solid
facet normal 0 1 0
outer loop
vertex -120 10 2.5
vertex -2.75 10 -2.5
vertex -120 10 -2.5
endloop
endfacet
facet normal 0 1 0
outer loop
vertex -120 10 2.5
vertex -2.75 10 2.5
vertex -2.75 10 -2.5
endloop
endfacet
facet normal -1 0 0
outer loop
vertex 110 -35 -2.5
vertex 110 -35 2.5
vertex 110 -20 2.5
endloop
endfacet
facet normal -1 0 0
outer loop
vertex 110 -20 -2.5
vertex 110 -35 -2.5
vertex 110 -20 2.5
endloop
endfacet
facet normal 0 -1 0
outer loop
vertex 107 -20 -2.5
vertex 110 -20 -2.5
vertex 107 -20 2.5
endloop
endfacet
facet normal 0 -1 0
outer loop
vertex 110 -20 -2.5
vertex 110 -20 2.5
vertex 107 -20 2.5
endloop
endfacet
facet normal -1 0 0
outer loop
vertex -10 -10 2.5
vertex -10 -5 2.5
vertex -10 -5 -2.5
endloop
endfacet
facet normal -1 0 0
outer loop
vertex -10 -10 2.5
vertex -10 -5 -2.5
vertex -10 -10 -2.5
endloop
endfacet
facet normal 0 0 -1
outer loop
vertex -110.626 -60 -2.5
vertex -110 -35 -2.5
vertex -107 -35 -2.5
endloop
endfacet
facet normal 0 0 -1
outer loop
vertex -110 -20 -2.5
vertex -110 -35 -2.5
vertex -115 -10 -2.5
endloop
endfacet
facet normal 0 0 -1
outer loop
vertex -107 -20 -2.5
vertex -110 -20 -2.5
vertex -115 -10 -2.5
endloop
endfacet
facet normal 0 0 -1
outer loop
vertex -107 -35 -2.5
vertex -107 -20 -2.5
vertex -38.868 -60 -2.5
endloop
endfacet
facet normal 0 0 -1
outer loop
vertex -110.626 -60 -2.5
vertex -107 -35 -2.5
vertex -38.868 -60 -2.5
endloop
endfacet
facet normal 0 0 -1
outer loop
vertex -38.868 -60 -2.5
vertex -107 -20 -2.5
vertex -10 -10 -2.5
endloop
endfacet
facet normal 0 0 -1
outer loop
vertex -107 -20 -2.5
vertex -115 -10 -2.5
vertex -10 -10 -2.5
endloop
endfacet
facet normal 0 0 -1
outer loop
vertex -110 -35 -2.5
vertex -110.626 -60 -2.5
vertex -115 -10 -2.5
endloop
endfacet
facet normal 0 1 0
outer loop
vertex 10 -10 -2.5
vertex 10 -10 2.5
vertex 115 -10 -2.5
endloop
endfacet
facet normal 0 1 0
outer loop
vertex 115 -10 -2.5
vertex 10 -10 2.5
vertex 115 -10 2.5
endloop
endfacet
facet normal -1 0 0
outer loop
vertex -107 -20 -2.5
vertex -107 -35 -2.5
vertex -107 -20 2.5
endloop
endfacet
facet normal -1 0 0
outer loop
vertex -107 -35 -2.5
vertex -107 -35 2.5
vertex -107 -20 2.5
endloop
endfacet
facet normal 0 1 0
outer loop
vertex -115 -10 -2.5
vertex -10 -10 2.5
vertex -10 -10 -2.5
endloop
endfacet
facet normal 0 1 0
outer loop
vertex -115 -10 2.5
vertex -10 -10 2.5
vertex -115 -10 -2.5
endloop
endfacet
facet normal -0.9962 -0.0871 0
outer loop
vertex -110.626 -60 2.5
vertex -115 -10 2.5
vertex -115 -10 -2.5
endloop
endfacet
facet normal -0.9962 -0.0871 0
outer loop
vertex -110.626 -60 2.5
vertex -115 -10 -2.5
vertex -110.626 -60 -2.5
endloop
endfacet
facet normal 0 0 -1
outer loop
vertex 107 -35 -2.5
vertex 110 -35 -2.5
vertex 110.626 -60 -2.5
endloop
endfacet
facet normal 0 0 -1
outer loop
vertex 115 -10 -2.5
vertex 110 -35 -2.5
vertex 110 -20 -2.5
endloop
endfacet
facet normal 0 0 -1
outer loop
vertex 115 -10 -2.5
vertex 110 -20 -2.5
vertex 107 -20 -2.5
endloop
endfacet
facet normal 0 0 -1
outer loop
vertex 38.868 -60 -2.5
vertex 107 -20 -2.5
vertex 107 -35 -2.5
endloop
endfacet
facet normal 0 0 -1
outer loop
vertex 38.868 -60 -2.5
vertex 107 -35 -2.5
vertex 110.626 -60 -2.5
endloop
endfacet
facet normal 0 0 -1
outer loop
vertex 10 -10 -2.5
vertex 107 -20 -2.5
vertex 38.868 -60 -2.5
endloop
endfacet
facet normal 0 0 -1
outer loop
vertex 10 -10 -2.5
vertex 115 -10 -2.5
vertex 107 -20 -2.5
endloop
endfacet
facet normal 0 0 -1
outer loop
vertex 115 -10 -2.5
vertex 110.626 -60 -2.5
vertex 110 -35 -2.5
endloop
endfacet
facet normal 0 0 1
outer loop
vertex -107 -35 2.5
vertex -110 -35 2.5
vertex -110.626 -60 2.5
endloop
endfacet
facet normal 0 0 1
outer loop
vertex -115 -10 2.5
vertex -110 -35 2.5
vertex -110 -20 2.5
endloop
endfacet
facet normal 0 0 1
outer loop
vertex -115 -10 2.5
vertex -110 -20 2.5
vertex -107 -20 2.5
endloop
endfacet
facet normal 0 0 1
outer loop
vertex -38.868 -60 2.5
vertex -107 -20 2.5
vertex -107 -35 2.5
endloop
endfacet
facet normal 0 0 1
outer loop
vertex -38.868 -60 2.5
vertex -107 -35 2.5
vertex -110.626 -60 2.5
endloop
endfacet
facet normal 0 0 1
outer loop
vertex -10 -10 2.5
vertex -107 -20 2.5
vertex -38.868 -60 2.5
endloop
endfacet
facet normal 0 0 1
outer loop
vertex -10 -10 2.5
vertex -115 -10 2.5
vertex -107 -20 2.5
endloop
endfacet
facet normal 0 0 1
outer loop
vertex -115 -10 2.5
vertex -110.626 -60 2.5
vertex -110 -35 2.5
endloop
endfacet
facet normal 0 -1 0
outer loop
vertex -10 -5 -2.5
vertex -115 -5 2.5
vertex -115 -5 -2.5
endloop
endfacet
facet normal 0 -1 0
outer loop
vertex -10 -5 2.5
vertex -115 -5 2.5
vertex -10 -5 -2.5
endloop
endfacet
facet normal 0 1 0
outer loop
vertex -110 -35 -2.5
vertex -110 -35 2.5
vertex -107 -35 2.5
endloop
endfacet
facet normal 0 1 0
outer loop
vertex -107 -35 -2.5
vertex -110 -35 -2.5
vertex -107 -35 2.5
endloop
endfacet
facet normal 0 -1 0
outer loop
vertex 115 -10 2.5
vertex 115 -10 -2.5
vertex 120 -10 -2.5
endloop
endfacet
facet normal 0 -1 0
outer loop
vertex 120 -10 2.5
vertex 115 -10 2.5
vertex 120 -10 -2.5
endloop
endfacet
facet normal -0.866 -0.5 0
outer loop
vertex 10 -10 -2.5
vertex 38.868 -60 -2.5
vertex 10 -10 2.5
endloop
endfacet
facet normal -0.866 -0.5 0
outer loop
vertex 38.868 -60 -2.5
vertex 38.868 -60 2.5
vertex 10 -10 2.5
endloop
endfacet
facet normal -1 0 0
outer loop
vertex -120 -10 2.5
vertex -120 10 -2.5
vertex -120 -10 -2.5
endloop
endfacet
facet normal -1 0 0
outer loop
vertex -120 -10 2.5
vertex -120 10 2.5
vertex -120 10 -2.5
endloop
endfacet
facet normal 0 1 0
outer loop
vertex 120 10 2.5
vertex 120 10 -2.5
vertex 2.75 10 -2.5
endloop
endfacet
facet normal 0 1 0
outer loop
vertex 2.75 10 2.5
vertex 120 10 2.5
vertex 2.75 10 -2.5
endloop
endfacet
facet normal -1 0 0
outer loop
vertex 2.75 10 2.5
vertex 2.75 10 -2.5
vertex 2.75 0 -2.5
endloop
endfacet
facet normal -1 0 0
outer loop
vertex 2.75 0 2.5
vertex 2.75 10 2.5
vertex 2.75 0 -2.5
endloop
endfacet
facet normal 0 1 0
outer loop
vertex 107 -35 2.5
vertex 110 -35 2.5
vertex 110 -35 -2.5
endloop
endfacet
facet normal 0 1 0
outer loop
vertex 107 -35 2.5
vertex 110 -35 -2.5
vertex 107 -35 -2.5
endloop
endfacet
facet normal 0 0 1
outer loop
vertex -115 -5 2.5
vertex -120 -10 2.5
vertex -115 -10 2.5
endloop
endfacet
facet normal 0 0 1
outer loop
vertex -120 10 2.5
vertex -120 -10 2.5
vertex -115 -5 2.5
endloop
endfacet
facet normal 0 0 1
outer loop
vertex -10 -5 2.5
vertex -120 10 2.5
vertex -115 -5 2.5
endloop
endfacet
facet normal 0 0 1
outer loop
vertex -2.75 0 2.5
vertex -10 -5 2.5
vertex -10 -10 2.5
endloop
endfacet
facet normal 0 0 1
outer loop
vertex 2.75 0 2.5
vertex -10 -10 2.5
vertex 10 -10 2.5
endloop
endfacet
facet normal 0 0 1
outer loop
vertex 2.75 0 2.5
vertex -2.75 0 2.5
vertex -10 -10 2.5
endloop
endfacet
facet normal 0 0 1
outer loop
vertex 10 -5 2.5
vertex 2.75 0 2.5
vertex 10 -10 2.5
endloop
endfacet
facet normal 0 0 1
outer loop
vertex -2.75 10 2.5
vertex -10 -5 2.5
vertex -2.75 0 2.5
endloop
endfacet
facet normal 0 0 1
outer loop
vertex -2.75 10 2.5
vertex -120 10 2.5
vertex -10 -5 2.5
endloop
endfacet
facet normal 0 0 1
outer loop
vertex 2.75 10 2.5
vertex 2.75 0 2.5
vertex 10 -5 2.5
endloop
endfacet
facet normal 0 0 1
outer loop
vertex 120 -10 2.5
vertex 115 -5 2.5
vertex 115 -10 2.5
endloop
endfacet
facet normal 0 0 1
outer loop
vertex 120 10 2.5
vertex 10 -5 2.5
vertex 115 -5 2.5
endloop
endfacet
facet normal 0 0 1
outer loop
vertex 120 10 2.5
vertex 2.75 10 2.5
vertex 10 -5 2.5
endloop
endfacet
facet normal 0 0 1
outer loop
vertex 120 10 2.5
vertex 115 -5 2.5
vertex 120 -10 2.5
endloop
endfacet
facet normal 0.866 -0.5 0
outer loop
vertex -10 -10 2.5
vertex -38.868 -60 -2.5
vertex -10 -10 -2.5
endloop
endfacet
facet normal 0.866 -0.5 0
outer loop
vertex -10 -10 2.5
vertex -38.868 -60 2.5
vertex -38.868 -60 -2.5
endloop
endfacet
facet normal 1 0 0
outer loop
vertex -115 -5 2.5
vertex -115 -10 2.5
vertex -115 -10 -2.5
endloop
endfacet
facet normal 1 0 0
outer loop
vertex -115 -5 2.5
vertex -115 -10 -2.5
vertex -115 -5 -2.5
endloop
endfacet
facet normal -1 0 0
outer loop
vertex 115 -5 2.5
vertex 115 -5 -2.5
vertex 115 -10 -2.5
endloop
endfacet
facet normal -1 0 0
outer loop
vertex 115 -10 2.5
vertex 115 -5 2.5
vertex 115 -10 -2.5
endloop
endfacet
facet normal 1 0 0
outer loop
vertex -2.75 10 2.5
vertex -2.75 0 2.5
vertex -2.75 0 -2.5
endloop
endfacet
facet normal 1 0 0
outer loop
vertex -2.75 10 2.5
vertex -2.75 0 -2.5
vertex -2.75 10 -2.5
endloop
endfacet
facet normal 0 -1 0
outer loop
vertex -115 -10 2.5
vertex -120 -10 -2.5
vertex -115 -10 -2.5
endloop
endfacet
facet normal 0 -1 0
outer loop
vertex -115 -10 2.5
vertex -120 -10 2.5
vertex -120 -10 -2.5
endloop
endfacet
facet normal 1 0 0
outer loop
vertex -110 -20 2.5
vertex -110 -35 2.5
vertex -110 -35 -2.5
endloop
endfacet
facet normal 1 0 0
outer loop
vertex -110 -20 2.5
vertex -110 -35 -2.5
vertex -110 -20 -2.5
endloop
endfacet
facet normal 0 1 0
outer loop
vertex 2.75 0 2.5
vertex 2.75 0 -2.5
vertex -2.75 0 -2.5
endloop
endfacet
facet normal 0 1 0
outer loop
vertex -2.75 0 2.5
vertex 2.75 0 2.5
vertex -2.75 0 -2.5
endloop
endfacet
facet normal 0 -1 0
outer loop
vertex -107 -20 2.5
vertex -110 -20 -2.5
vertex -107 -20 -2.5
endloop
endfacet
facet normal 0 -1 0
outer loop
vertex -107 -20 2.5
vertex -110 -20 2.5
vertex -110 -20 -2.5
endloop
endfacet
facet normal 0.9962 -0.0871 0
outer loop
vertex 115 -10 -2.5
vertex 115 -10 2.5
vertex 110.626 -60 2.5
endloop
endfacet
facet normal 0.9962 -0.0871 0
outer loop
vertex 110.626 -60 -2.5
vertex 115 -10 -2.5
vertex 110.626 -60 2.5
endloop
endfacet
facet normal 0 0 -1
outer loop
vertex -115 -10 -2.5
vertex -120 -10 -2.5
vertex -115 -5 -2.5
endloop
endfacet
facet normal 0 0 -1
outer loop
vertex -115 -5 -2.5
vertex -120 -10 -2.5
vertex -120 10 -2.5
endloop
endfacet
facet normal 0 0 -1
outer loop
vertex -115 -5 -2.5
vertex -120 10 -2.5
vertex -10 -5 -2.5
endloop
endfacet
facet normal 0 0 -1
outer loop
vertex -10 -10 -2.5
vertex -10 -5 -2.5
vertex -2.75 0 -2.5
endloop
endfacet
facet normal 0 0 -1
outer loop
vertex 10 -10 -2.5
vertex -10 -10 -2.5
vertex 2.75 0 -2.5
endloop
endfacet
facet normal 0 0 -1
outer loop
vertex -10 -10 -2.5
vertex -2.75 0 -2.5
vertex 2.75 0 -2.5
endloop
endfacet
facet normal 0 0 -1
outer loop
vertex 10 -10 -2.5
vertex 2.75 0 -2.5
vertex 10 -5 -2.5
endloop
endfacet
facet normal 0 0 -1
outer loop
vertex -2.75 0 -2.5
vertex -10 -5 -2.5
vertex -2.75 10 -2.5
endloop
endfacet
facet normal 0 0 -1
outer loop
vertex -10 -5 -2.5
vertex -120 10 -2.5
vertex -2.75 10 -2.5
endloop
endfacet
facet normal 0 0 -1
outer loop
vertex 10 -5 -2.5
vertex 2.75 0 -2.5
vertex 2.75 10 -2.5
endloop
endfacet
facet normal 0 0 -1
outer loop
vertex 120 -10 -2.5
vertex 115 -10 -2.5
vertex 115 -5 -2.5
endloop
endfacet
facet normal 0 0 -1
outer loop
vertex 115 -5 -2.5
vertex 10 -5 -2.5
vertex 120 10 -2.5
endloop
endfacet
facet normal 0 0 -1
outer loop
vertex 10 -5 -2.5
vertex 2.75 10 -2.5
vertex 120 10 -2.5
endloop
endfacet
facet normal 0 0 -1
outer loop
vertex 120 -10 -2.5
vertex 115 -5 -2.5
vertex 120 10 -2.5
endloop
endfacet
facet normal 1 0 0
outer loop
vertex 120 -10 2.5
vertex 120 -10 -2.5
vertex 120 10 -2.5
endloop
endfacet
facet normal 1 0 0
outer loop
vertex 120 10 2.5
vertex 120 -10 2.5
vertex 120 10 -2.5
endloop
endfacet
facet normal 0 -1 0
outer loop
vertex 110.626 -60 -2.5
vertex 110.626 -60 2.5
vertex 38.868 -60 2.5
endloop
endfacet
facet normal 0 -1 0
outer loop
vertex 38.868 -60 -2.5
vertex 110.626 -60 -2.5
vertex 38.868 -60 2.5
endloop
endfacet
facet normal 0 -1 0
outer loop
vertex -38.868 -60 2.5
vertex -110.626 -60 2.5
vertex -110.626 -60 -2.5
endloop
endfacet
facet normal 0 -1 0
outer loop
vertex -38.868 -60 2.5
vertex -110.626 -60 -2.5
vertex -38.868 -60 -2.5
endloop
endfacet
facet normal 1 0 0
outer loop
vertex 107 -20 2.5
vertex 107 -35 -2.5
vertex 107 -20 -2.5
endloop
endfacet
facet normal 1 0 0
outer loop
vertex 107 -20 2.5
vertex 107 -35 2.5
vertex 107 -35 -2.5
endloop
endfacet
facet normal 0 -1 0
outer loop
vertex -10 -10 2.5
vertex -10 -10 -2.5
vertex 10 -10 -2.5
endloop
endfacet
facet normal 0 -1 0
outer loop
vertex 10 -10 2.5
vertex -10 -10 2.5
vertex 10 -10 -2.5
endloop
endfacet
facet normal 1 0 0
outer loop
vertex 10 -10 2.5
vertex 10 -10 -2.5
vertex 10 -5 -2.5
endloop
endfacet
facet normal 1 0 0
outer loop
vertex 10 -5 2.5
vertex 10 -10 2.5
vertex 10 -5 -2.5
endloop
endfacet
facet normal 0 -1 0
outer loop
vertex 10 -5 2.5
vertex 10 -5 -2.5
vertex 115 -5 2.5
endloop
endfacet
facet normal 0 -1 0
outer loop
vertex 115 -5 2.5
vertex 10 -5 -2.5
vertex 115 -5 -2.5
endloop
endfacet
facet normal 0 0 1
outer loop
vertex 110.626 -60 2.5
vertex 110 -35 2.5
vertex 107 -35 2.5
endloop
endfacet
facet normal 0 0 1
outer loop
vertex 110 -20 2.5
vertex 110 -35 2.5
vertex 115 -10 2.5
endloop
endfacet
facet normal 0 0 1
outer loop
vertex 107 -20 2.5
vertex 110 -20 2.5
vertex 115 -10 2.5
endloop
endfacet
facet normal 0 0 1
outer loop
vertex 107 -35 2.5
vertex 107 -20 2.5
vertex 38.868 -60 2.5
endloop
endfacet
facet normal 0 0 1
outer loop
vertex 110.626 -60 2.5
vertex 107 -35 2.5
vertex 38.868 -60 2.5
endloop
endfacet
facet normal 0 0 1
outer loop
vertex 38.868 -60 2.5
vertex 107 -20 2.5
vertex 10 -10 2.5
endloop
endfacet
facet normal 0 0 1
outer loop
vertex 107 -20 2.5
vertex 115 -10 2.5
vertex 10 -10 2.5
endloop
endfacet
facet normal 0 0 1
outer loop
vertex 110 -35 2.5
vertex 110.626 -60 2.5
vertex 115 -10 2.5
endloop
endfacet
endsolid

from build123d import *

# Parameters (mm, degrees)
SKETCH1_W             = 3
SKETCH1_H             = 15
BOSS_EXTRUDE2_DEPTH   = 2.5
BOSS_EXTRUDE2_2_DEPTH = 2.5
MIRROR1_START         = -2.5
MIRROR1_DEPTH         = 5


# Read off the part's stored shape, not the designer's step: Mirror1
with BuildPart() as part:
    # Sketch1 → Boss-Extrude2 (new, symmetric)
    with BuildSketch(Plane.XY):
        Polygon((-10, -10), (-115, -10), (-110.625566824, -60), (-38.867513459, -60), align=None)
        with Locations((-108.5, -27.5)):
            Rectangle(SKETCH1_W, SKETCH1_H, mode=Mode.SUBTRACT)
    extrude(amount=BOSS_EXTRUDE2_DEPTH, both=True)


with BuildPart() as body_2:
    # Sketch1 → Boss-Extrude2 2 (new, symmetric)
    with BuildSketch(Plane.XY):
        Polygon((-120, -10), (-115, -10), (-115, -5), (-10, -5), (-10, -10), (0, -10), (0, 0), (-2.75, 0), (-2.75, 10), (-120, 10), align=None)
    extrude(amount=BOSS_EXTRUDE2_2_DEPTH, both=True)

    # Mirror1 outline → Mirror1 (add)
    with BuildSketch(Plane.XY.offset(MIRROR1_START)):
        Polygon((0, -10), (10, -10), (10, -5), (115, -5), (115, -10), (120, -10), (120, 10), (2.75, 10), (2.75, 0), (0, 0), align=None)
    extrude(amount=MIRROR1_DEPTH)


with BuildPart() as body_3:
    # Mirror3: mirrored copy
    add(part.part.mirror(Plane(origin=(0, 0, 0), x_dir=(0, 0, 1), z_dir=(1, 0, 0))))


solid = Compound([part.part, body_2.part, body_3.part])
